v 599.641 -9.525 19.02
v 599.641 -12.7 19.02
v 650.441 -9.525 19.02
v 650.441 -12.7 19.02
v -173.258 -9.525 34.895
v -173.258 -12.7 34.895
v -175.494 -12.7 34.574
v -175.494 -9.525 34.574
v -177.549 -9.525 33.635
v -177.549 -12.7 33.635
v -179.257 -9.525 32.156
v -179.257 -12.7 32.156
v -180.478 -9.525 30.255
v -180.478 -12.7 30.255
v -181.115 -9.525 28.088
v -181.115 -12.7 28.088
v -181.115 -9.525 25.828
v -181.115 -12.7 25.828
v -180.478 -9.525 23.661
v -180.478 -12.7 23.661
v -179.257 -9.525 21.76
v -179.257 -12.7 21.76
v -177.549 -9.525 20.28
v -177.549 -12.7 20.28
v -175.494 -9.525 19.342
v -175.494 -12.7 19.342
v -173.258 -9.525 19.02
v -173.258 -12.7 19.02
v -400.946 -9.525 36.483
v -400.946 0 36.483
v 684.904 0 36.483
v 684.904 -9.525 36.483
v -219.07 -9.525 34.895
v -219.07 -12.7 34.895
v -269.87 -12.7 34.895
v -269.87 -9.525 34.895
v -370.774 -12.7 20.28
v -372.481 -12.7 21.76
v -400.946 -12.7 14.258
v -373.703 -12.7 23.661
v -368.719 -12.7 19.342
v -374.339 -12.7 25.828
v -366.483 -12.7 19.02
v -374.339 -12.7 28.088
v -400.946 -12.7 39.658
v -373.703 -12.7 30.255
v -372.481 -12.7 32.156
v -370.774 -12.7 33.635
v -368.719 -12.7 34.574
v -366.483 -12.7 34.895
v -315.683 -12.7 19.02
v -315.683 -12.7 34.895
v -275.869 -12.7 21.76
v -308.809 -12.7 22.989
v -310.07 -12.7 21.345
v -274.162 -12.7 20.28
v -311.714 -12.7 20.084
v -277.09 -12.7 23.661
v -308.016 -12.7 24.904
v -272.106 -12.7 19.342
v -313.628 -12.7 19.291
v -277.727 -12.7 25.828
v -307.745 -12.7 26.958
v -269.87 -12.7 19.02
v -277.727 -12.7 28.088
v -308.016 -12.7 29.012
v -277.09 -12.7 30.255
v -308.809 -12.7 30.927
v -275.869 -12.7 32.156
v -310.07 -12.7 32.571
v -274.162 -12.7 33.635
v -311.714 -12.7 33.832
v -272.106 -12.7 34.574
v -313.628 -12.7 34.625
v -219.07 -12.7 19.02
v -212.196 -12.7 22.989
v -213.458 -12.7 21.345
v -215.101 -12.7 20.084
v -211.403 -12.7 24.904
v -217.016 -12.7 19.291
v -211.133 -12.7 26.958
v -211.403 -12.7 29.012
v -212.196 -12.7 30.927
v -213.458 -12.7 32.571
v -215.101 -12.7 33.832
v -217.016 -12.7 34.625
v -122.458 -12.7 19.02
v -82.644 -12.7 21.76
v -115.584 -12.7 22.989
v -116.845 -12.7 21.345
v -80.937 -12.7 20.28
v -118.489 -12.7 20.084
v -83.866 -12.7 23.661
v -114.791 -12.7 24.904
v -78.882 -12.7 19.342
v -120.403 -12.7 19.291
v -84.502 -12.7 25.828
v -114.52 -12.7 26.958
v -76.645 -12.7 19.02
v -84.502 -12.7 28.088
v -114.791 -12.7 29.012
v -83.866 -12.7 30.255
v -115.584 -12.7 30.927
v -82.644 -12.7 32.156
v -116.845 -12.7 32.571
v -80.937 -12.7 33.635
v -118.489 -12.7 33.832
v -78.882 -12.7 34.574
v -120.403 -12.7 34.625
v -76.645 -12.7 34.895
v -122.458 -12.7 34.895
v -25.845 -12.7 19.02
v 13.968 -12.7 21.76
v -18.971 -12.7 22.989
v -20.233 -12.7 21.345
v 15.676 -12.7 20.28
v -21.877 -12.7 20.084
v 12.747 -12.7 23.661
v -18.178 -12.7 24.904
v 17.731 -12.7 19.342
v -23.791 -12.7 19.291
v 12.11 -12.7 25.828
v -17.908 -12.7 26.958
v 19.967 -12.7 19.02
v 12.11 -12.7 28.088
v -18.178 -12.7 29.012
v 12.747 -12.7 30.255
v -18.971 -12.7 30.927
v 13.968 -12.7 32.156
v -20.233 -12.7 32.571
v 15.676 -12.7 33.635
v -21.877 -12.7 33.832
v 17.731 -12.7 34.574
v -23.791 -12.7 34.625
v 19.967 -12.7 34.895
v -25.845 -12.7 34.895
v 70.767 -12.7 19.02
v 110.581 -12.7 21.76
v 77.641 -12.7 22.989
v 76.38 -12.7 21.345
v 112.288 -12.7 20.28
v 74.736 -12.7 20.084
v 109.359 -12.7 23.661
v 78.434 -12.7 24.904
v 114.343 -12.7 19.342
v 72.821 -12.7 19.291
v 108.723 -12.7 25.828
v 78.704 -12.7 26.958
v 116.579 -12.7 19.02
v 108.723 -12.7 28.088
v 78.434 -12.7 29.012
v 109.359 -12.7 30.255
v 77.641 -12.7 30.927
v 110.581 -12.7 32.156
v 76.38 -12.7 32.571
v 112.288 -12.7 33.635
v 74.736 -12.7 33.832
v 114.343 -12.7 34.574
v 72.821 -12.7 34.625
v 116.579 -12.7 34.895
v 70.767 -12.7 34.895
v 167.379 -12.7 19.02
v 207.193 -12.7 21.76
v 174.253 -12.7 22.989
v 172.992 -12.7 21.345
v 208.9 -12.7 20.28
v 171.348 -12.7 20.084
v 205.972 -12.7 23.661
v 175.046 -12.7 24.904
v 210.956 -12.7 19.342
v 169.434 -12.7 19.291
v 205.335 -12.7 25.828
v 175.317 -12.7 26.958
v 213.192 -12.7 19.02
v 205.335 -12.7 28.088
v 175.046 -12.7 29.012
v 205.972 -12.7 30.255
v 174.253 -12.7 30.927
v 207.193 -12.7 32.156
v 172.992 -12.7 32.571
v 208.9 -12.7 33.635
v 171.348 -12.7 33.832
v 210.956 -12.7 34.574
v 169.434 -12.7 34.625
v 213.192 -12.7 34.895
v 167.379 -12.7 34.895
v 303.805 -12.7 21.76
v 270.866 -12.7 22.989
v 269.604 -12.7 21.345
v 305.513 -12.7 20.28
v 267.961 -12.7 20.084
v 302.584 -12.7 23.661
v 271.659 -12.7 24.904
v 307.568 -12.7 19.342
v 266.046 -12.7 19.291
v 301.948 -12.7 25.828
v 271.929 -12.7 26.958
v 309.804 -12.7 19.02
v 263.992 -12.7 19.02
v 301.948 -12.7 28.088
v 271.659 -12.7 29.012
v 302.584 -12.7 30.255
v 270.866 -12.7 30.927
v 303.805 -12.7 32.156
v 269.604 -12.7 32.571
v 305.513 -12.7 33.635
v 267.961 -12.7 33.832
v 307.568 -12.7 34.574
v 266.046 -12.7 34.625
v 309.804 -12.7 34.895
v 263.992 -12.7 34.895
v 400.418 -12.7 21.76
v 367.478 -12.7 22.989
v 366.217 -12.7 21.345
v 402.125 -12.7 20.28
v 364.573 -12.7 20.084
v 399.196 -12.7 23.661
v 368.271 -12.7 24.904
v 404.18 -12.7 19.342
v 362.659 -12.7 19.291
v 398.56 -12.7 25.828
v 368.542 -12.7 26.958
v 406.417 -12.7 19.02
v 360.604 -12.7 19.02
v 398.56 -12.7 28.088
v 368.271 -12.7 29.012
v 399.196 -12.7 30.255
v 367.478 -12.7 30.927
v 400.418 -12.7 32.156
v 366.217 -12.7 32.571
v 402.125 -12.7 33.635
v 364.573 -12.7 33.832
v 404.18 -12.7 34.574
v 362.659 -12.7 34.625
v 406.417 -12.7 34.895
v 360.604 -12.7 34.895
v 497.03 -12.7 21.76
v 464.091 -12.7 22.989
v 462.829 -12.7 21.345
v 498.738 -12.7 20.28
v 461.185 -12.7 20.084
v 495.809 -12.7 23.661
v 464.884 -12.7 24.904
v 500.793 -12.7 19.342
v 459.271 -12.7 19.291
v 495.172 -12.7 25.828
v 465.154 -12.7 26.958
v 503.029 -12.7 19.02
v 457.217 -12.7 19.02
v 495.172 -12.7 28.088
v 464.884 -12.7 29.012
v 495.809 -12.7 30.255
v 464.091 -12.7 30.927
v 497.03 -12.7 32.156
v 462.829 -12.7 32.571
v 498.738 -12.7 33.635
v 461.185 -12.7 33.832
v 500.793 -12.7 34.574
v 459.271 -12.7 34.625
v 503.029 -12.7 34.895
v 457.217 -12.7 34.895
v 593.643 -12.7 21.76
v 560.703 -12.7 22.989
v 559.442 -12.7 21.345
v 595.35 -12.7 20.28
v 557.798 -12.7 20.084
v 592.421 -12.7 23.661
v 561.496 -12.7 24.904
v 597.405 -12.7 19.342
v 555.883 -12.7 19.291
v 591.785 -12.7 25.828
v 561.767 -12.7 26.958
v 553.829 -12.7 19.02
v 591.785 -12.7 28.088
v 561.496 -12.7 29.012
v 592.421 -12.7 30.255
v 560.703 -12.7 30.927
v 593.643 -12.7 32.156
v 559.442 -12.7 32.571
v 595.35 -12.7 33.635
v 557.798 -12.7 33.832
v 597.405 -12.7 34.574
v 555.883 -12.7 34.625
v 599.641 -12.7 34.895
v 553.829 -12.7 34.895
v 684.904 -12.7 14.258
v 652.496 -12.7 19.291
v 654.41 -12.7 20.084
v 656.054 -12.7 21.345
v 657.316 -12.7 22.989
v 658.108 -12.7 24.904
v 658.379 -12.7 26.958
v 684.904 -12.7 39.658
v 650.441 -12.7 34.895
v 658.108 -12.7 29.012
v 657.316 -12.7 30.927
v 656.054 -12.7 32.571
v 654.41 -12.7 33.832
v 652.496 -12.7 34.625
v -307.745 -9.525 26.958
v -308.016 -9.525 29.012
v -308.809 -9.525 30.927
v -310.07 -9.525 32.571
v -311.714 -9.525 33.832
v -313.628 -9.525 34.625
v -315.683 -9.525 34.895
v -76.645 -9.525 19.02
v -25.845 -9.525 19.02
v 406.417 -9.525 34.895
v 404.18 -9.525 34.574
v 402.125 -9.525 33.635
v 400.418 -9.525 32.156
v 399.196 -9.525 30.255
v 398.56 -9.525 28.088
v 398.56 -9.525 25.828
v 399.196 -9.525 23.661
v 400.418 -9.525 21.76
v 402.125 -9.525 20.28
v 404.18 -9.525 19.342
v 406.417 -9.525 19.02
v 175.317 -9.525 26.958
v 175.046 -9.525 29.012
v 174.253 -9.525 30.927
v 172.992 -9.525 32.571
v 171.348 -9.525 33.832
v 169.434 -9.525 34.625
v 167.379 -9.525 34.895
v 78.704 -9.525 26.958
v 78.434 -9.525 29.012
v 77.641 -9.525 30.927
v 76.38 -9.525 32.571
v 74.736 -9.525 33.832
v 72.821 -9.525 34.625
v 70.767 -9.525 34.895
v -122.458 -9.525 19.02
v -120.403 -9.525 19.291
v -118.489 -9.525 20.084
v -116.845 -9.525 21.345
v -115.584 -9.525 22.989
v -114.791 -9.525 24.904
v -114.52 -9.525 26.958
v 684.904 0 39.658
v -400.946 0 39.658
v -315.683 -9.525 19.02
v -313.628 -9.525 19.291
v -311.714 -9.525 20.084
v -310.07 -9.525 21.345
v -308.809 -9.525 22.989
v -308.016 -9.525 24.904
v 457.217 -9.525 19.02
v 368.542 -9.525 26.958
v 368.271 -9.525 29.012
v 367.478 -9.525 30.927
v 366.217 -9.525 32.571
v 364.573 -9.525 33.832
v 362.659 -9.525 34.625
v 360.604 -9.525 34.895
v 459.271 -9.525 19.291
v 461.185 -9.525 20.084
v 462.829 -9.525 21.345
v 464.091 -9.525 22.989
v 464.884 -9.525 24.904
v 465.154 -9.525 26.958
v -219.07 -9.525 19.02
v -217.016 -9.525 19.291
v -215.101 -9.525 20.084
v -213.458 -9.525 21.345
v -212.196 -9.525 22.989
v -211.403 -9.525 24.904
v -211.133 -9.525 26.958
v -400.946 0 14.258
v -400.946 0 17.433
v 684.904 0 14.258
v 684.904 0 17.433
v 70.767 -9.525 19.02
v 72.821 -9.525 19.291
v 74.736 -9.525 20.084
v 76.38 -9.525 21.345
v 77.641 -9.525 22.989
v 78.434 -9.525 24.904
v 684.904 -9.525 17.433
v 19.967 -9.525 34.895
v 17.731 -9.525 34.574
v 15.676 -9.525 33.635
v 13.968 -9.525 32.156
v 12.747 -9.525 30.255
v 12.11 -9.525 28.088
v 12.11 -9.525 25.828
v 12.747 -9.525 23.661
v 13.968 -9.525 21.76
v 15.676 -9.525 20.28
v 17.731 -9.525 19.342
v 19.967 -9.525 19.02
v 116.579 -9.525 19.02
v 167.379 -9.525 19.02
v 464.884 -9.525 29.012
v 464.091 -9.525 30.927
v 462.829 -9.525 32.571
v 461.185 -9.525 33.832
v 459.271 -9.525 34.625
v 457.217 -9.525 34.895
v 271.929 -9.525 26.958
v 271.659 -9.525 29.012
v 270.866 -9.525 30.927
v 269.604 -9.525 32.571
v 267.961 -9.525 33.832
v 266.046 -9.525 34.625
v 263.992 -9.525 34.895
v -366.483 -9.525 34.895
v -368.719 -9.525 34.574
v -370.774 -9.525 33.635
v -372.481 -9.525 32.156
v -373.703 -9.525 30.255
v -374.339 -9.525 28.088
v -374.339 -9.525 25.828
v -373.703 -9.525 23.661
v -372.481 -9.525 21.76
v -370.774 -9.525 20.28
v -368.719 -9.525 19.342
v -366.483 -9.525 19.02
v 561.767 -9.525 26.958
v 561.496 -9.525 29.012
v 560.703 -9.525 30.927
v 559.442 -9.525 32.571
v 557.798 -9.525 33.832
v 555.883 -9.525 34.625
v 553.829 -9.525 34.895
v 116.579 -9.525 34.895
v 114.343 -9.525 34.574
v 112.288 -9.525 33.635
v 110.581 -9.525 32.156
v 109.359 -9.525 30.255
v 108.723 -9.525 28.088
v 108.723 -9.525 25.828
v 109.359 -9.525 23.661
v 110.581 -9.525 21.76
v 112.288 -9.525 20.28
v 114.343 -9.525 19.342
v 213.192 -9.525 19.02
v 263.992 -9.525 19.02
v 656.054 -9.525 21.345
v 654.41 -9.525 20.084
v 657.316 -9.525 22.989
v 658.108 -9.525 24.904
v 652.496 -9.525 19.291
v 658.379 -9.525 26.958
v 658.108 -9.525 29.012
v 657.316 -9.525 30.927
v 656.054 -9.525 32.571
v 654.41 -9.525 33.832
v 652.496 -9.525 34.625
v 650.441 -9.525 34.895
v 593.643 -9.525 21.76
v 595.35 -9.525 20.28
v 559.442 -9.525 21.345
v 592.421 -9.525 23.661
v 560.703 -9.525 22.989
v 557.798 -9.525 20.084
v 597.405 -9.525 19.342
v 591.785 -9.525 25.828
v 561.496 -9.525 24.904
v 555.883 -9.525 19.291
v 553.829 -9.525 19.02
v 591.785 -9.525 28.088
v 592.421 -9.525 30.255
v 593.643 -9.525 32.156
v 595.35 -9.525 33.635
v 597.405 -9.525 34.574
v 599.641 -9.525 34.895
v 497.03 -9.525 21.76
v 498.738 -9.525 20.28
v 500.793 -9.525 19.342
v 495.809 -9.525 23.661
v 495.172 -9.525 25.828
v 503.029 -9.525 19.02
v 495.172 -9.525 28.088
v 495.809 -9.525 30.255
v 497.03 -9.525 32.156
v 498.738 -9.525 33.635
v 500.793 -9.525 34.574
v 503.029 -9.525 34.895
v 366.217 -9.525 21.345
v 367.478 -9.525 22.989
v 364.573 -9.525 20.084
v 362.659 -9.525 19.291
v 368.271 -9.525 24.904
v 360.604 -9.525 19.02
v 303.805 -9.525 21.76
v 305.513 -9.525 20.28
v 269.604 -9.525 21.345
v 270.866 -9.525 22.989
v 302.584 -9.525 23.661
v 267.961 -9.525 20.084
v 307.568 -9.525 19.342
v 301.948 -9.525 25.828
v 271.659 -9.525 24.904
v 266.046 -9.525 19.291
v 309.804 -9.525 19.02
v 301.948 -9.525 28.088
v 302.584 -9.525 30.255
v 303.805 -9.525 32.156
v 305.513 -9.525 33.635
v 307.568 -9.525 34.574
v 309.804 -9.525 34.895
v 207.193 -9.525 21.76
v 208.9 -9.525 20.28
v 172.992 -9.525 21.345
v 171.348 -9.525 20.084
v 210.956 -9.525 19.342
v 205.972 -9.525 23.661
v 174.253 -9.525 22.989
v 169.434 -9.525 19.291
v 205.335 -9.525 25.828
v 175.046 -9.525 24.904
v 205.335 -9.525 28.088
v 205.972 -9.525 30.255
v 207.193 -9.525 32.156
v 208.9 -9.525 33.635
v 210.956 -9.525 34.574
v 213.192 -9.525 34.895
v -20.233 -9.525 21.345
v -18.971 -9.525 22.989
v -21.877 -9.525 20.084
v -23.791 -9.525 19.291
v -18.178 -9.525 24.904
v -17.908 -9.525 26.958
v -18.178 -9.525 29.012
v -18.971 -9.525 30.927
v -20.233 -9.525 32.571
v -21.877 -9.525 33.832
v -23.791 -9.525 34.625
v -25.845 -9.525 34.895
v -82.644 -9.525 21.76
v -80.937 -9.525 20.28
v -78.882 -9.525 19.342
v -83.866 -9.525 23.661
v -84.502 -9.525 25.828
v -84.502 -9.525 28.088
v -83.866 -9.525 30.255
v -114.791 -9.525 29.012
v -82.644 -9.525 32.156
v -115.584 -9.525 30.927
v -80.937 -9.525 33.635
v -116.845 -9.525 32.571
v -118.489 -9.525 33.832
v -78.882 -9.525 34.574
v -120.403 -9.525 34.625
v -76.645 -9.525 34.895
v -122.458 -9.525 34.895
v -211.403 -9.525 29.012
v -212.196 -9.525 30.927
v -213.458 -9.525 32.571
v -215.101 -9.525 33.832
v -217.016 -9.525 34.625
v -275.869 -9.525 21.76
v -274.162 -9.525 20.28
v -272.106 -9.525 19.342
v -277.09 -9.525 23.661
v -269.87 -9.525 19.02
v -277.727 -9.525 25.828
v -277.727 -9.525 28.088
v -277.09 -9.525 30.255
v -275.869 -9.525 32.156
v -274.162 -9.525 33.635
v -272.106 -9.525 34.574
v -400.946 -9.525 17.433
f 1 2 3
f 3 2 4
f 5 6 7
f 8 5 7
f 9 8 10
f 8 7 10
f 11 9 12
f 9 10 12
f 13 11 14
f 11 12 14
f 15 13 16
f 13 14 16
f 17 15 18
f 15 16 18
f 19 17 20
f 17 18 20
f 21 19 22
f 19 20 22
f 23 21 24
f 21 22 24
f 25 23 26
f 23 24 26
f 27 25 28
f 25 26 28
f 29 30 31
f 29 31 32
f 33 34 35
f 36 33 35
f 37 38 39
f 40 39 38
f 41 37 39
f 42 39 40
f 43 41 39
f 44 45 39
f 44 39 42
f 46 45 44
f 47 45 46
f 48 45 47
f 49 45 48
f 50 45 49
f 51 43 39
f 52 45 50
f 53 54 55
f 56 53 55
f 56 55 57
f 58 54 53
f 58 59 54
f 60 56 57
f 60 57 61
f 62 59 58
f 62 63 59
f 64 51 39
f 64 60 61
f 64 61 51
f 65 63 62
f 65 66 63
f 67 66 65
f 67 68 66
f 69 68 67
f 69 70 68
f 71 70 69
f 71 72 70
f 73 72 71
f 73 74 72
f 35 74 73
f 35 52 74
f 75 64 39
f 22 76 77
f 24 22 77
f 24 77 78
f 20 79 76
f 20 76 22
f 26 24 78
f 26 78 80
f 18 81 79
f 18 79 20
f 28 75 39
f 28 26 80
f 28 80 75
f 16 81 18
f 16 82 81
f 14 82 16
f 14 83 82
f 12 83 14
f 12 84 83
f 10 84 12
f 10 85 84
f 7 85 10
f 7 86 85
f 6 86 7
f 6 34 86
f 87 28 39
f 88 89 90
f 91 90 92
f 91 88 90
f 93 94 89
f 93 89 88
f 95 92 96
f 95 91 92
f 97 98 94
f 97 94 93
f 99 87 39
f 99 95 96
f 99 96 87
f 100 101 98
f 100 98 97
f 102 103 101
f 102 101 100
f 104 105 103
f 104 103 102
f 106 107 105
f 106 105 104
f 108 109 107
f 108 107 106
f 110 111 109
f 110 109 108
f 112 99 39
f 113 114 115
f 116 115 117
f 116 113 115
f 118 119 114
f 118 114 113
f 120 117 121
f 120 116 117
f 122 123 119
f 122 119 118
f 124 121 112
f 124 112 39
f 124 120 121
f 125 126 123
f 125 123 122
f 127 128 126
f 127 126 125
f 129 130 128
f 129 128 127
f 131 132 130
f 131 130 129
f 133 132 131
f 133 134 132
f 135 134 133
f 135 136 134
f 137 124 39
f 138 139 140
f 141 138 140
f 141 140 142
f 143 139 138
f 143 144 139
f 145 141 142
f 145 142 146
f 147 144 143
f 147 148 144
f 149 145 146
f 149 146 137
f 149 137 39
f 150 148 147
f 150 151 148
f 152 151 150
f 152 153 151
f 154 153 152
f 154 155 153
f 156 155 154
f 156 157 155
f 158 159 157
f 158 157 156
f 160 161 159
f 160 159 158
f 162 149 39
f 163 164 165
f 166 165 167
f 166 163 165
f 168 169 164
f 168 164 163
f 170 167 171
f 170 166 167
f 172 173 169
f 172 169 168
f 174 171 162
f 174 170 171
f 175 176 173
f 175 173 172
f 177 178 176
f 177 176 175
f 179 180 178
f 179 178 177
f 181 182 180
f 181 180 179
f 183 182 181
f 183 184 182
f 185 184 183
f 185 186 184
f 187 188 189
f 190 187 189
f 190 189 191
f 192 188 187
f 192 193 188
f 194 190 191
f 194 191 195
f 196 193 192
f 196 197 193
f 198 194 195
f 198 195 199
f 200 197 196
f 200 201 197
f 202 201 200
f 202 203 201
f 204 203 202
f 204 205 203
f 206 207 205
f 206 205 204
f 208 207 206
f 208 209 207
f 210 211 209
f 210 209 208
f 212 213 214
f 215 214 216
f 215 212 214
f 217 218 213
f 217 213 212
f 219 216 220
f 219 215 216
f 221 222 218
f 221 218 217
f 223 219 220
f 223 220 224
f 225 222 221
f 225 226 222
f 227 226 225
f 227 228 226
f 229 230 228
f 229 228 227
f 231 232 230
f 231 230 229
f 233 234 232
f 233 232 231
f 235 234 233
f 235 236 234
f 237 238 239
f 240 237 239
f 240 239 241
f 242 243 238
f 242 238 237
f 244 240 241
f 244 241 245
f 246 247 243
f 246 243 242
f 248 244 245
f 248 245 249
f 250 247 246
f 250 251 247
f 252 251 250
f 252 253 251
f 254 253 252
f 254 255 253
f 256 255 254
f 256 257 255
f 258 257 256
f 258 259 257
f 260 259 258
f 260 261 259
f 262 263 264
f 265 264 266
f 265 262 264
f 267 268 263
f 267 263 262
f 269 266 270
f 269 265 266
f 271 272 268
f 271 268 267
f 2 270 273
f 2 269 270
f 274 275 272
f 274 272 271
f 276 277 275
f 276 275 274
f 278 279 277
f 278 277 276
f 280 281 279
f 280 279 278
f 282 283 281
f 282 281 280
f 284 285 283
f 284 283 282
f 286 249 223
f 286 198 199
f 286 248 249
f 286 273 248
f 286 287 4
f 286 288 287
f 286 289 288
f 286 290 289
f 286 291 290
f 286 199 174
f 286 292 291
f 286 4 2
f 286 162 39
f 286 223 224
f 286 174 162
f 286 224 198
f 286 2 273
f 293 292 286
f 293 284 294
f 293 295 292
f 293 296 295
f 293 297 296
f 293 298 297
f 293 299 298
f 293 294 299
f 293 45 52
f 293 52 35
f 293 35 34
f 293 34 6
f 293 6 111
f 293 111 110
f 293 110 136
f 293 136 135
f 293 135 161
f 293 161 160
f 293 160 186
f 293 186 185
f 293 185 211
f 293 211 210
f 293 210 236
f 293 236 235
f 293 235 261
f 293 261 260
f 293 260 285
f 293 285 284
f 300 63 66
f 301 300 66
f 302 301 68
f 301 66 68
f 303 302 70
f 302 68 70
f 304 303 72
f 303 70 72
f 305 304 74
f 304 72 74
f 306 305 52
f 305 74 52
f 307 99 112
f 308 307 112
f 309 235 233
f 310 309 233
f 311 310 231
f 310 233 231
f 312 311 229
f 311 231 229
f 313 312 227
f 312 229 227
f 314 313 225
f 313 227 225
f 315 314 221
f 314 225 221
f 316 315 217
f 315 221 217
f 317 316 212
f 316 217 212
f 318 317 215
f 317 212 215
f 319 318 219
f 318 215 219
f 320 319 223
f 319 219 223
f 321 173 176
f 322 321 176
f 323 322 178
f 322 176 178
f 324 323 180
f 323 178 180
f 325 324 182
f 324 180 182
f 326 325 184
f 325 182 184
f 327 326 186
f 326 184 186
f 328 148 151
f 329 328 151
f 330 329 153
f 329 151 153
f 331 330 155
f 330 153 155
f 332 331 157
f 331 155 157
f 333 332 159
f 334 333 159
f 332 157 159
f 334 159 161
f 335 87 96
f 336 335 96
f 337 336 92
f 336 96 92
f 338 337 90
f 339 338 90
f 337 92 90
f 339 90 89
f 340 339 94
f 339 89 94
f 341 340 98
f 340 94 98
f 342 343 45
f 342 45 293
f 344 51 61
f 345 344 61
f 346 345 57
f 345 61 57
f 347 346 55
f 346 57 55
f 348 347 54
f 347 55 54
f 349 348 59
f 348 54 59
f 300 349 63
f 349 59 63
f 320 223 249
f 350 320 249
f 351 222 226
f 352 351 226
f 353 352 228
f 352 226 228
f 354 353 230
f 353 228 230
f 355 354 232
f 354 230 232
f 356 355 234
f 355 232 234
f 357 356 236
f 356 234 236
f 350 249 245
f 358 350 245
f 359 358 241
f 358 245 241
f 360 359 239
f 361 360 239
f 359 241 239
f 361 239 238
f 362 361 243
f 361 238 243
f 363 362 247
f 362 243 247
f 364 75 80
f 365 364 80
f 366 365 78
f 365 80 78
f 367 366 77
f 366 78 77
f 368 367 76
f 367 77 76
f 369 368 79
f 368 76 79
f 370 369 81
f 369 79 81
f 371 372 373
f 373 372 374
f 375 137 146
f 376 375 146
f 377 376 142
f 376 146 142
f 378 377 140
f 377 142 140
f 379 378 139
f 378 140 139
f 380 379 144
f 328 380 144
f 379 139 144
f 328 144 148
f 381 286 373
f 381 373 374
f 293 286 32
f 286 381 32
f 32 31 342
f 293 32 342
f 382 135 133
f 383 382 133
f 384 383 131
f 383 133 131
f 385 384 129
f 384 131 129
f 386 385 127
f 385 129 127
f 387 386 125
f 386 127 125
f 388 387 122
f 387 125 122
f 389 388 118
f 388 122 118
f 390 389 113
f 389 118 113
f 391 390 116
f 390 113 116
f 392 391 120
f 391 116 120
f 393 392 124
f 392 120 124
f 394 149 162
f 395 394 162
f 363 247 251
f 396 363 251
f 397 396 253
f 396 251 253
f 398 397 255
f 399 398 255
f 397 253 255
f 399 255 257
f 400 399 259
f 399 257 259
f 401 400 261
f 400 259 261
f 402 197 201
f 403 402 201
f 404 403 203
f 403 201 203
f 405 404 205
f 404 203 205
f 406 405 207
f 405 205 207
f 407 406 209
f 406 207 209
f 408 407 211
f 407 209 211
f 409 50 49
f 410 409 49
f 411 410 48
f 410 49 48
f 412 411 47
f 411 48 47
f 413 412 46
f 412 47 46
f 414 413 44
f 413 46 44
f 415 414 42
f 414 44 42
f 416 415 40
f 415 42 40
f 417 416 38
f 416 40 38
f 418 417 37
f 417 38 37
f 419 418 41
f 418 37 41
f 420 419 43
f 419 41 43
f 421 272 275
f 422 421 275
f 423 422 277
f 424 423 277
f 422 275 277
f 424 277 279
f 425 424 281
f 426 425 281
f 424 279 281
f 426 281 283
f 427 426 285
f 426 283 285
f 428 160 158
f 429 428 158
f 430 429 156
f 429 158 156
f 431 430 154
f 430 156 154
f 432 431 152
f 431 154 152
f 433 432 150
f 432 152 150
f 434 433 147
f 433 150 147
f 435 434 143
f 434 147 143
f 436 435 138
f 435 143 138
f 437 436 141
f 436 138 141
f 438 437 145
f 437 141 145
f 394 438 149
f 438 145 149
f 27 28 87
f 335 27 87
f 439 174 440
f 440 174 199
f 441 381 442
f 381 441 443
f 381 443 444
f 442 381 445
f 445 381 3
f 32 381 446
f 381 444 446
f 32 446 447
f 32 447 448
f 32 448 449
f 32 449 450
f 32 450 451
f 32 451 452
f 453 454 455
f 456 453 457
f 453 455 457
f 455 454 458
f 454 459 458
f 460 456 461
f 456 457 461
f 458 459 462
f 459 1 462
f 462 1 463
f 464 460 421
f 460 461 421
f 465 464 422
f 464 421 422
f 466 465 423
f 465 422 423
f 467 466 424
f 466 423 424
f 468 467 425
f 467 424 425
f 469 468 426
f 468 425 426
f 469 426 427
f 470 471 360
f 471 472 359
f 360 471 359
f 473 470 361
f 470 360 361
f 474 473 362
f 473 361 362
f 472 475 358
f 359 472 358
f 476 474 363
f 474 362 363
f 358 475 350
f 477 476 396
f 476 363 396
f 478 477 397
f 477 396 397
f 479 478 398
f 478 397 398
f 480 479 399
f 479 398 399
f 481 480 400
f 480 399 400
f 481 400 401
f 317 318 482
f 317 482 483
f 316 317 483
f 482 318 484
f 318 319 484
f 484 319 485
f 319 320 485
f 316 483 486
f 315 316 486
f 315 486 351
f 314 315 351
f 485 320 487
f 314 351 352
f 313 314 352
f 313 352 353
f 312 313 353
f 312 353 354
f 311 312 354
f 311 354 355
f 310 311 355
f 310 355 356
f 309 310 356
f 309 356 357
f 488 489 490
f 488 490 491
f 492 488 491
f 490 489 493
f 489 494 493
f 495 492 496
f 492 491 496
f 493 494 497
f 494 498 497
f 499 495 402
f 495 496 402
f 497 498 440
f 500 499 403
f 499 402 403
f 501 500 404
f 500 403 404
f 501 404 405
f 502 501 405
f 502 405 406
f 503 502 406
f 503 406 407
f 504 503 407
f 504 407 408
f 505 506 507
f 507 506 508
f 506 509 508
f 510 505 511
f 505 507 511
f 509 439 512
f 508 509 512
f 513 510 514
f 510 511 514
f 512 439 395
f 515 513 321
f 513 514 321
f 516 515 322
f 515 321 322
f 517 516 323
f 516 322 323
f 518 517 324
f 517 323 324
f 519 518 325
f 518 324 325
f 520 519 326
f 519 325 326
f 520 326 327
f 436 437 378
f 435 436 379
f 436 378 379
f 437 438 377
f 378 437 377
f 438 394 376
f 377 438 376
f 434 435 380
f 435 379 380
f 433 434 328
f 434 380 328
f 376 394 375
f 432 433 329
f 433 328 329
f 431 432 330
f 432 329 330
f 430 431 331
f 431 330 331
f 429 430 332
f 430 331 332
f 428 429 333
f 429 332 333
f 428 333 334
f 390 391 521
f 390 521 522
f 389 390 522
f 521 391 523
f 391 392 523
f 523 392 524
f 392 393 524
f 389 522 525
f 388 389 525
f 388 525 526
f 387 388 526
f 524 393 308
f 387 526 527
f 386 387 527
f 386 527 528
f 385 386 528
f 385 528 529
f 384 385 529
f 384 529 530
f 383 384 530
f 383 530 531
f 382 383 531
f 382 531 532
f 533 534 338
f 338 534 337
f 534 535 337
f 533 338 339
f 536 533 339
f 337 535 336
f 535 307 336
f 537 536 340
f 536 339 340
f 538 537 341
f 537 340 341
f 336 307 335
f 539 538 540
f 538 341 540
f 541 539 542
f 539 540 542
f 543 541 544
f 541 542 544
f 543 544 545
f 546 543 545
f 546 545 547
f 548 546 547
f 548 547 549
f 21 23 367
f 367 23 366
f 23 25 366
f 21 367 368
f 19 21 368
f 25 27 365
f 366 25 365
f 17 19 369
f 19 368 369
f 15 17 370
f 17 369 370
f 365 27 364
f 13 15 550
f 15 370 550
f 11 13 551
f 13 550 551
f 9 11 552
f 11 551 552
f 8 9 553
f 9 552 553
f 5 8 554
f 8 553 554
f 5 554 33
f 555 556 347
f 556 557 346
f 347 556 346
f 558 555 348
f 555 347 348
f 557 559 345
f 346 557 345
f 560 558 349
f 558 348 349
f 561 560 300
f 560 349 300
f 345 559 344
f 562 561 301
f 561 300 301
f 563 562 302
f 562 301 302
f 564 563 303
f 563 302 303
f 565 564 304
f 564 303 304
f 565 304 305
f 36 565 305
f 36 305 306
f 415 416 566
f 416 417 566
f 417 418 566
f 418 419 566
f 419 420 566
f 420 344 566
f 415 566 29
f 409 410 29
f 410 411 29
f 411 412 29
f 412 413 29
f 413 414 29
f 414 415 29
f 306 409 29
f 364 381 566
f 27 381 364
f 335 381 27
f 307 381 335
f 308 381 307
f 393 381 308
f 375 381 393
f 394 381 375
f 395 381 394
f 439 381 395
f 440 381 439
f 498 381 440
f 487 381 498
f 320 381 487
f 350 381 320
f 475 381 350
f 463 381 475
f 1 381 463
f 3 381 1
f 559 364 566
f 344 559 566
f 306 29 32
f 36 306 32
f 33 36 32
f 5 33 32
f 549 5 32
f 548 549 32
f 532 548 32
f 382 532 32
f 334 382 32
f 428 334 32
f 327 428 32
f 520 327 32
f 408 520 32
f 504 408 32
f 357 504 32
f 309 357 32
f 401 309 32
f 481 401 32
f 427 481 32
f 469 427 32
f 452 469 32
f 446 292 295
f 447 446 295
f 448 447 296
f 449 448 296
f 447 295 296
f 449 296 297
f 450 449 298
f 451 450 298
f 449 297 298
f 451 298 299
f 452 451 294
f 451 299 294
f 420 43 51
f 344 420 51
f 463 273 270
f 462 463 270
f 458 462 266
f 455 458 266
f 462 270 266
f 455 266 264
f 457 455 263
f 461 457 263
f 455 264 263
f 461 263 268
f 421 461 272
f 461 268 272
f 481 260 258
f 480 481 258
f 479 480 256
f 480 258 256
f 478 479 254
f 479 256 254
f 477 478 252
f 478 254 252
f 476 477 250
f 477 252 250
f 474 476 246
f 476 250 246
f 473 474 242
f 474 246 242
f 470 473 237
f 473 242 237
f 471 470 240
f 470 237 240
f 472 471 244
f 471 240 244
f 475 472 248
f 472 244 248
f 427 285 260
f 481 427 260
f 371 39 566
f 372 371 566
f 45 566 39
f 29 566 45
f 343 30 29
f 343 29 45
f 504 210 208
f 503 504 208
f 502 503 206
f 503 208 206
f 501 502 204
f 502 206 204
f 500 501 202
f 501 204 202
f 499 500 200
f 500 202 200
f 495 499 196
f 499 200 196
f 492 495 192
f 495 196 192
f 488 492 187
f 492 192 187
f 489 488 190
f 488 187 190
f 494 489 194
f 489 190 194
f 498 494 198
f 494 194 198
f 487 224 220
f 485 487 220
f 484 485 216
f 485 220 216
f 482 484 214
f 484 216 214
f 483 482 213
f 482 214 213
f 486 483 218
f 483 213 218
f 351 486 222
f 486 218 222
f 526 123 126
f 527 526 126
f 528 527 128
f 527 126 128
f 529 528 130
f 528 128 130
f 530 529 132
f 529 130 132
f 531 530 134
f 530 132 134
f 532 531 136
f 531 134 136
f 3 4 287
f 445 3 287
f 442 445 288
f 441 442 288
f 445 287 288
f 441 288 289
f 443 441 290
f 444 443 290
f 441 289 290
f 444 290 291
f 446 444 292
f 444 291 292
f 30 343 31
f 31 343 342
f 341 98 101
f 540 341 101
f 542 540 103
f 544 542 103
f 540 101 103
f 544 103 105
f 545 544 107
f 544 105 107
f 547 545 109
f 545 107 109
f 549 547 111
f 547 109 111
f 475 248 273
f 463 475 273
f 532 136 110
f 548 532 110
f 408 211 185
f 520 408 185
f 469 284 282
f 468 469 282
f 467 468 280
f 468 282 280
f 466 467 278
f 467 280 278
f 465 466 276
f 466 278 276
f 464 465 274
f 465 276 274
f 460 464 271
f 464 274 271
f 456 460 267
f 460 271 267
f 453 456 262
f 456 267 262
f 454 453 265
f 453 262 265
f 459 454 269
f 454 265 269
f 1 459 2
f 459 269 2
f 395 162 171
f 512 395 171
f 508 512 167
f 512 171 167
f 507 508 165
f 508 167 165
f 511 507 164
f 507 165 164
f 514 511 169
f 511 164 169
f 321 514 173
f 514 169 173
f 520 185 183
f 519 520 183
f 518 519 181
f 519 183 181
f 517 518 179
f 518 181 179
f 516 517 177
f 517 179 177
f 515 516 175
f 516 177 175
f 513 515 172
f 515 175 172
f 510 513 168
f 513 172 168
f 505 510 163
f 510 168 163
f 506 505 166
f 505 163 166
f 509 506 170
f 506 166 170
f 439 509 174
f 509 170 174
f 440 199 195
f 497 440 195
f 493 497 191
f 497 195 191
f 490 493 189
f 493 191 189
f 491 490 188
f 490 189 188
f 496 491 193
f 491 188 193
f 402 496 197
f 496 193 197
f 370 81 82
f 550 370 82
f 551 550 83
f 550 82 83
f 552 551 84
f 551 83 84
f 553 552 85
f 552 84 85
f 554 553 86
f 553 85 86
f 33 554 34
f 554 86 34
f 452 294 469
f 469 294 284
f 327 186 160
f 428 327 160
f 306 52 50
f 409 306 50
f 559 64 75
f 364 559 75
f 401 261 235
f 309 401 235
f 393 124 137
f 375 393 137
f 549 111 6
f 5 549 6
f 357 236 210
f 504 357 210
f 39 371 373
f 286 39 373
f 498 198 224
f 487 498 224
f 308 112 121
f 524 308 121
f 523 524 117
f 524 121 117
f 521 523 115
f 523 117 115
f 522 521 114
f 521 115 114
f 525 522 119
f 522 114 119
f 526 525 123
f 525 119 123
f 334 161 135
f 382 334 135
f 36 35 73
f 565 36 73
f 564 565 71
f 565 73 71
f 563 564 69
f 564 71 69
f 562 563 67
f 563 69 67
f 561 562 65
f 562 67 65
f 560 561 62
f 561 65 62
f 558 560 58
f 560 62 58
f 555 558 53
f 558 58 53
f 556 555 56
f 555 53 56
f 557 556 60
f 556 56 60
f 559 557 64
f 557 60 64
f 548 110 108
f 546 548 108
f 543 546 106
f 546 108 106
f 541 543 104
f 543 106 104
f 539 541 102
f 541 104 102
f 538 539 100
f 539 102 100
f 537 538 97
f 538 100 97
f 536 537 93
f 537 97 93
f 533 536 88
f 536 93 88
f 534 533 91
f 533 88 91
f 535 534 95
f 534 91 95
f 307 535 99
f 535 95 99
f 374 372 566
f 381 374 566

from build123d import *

# Parameters (mm, degrees)
F0_W     = 1085.85
F0_H     = 25.4
F1_DEPTH = 12.7
F2_W     = 9.525
F2_H     = 19.05
F3_DEPTH = 1085.851
F5_DEPTH = 12.701


with BuildPart() as f1:
    # F0 (on Front) → F1 (new body)
    with BuildSketch(Plane.XZ):
        with Locations((141.979393, 26.957907)):
            Rectangle(F0_W, F0_H)
    extrude(amount=F1_DEPTH)

    # F2 (on face) → F3 (cut, through all)
    with BuildSketch(Plane(origin=(-400.945607, 0, 0), x_dir=(0, -1, 0), z_dir=(-1, 0, 0))):
        with Locations((4.7625, 26.957907)):
            Rectangle(F2_W, F2_H)
    extrude(amount=-F3_DEPTH, mode=Mode.SUBTRACT)

    # F4 (on face) → F5 (cut, through all)
    with BuildSketch(Plane.XZ.offset(12.7)):
        with BuildLine():
            ThreePointArc((-366.482657, 19.020407), (-360.869997, 21.345247), (-358.545157, 26.957907))
            ThreePointArc((-358.545157, 26.957907), (-360.869997, 32.570567), (-366.482657, 34.895407))
            ThreePointArc((-366.482657, 34.895407), (-374.420157, 26.957907), (-366.482657, 19.020407))
        make_face()
        with BuildLine():
            ThreePointArc((-366.482657, 34.895407), (-360.869997, 32.570567), (-358.545157, 26.957907))
            ThreePointArc((-358.545157, 26.957907), (-360.869997, 21.345247), (-366.482657, 19.020407))
            Line((-366.482657, 19.020407), (-315.682657, 19.020407))
            ThreePointArc((-315.682657, 19.020407), (-323.620157, 26.957907), (-315.682657, 34.895407))
            Line((-315.682657, 34.895407), (-366.482657, 34.895407))
        make_face()
        with BuildLine():
            ThreePointArc((-307.745157, 26.957907), (-310.069997, 32.570567), (-315.682657, 34.895407))
            ThreePointArc((-315.682657, 34.895407), (-323.620157, 26.957907), (-315.682657, 19.020407))
            ThreePointArc((-315.682657, 19.020407), (-310.069997, 21.345247), (-307.745157, 26.957907))
        make_face()
        with BuildLine():
            ThreePointArc((-261.932747, 26.957907), (-264.257587, 32.570567), (-269.870247, 34.895407))
            ThreePointArc((-269.870247, 34.895407), (-277.807747, 26.957907), (-269.870247, 19.020407))
            ThreePointArc((-269.870247, 19.020407), (-264.257587, 21.345247), (-261.932747, 26.957907))
        make_face()
        with BuildLine():
            Line((-219.070247, 34.895407), (-269.870247, 34.895407))
            ThreePointArc((-269.870247, 34.895407), (-264.257587, 32.570567), (-261.932747, 26.957907))
            ThreePointArc((-261.932747, 26.957907), (-264.257587, 21.345247), (-269.870247, 19.020407))
            Line((-269.870247, 19.020407), (-219.070247, 19.020407))
            ThreePointArc((-219.070247, 19.020407), (-227.007747, 26.957907), (-219.070247, 34.895407))
        make_face()
        with BuildLine():
            ThreePointArc((-211.132747, 26.957907), (-213.457587, 32.570567), (-219.070247, 34.895407))
            ThreePointArc((-219.070247, 34.895407), (-227.007747, 26.957907), (-219.070247, 19.020407))
            ThreePointArc((-219.070247, 19.020407), (-213.457587, 21.345247), (-211.132747, 26.957907))
        make_face()
        with BuildLine():
            ThreePointArc((-165.320337, 26.957907), (-167.645177, 32.570567), (-173.257837, 34.895407))
            ThreePointArc((-173.257837, 34.895407), (-181.195337, 26.957907), (-173.257837, 19.020407))
            ThreePointArc((-173.257837, 19.020407), (-167.645177, 21.345247), (-165.320337, 26.957907))
        make_face()
        with BuildLine():
            Line((-122.457837, 34.895407), (-173.257837, 34.895407))
            ThreePointArc((-173.257837, 34.895407), (-167.645177, 32.570567), (-165.320337, 26.957907))
            ThreePointArc((-165.320337, 26.957907), (-167.645177, 21.345247), (-173.257837, 19.020407))
            Line((-173.257837, 19.020407), (-122.457837, 19.020407))
            ThreePointArc((-122.457837, 19.020407), (-130.395337, 26.957907), (-122.457837, 34.895407))
        make_face()
        with BuildLine():
            ThreePointArc((-114.520337, 26.957907), (-116.845177, 32.570567), (-122.457837, 34.895407))
            ThreePointArc((-122.457837, 34.895407), (-130.395337, 26.957907), (-122.457837, 19.020407))
            ThreePointArc((-122.457837, 19.020407), (-116.845177, 21.345247), (-114.520337, 26.957907))
        make_face()
        with BuildLine():
            ThreePointArc((-68.707927, 26.957907), (-71.032767, 32.570567), (-76.645427, 34.895407))
            ThreePointArc((-76.645427, 34.895407), (-84.582927, 26.957907), (-76.645427, 19.020407))
            ThreePointArc((-76.645427, 19.020407), (-71.032767, 21.345247), (-68.707927, 26.957907))
        make_face()
        with BuildLine():
            Line((-25.845427, 34.895407), (-76.645427, 34.895407))
            ThreePointArc((-76.645427, 34.895407), (-71.032767, 32.570567), (-68.707927, 26.957907))
            ThreePointArc((-68.707927, 26.957907), (-71.032767, 21.345247), (-76.645427, 19.020407))
            Line((-76.645427, 19.020407), (-25.845427, 19.020407))
            ThreePointArc((-25.845427, 19.020407), (-33.782927, 26.957907), (-25.845427, 34.895407))
        make_face()
        with BuildLine():
            ThreePointArc((-17.907927, 26.957907), (-20.232767, 32.570567), (-25.845427, 34.895407))
            ThreePointArc((-25.845427, 34.895407), (-33.782927, 26.957907), (-25.845427, 19.020407))
            ThreePointArc((-25.845427, 19.020407), (-20.232767, 21.345247), (-17.907927, 26.957907))
        make_face()
        with BuildLine():
            ThreePointArc((27.904483, 26.957907), (25.579643, 32.570567), (19.966983, 34.895407))
            ThreePointArc((19.966983, 34.895407), (12.029483, 26.957907), (19.966983, 19.020407))
            ThreePointArc((19.966983, 19.020407), (25.579643, 21.345247), (27.904483, 26.957907))
        make_face()
        with BuildLine():
            Line((70.766983, 34.895407), (19.966983, 34.895407))
            ThreePointArc((19.966983, 34.895407), (25.579643, 32.570567), (27.904483, 26.957907))
            ThreePointArc((27.904483, 26.957907), (25.579643, 21.345247), (19.966983, 19.020407))
            Line((19.966983, 19.020407), (70.766983, 19.020407))
            ThreePointArc((70.766983, 19.020407), (62.829483, 26.957907), (70.766983, 34.895407))
        make_face()
        with BuildLine():
            ThreePointArc((78.704483, 26.957907), (76.379643, 32.570567), (70.766983, 34.895407))
            ThreePointArc((70.766983, 34.895407), (62.829483, 26.957907), (70.766983, 19.020407))
            ThreePointArc((70.766983, 19.020407), (76.379643, 21.345247), (78.704483, 26.957907))
        make_face()
        with BuildLine():
            ThreePointArc((124.516893, 26.957907), (122.192053, 32.570567), (116.579393, 34.895407))
            ThreePointArc((116.579393, 34.895407), (108.641893, 26.957907), (116.579393, 19.020407))
            ThreePointArc((116.579393, 19.020407), (122.192053, 21.345247), (124.516893, 26.957907))
        make_face()
        with BuildLine():
            Line((141.979393, 34.895407), (116.579393, 34.895407))
            ThreePointArc((116.579393, 34.895407), (122.192053, 32.570567), (124.516893, 26.957907))
            ThreePointArc((124.516893, 26.957907), (122.192053, 21.345247), (116.579393, 19.020407))
            Line((116.579393, 19.020407), (141.979393, 19.020407))
            Line((141.979393, 19.020407), (141.979393, 34.895407))
        make_face()
        with BuildLine():
            Line((167.379393, 34.895407), (141.979393, 34.895407))
            Line((141.979393, 34.895407), (141.979393, 19.020407))
            Line((141.979393, 19.020407), (167.379393, 19.020407))
            ThreePointArc((167.379393, 19.020407), (159.441893, 26.957907), (167.379393, 34.895407))
        make_face()
        with BuildLine():
            ThreePointArc((175.316893, 26.957907), (172.992053, 32.570567), (167.379393, 34.895407))
            ThreePointArc((167.379393, 34.895407), (159.441893, 26.957907), (167.379393, 19.020407))
            ThreePointArc((167.379393, 19.020407), (172.992053, 21.345247), (175.316893, 26.957907))
        make_face()
        with BuildLine():
            ThreePointArc((213.191803, 19.020407), (218.804463, 21.345247), (221.129303, 26.957907))
            ThreePointArc((221.129303, 26.957907), (218.804463, 32.570567), (213.191803, 34.895407))
            ThreePointArc((213.191803, 34.895407), (205.254303, 26.957907), (213.191803, 19.020407))
        make_face()
        with BuildLine():
            ThreePointArc((213.191803, 34.895407), (218.804463, 32.570567), (221.129303, 26.957907))
            ThreePointArc((221.129303, 26.957907), (218.804463, 21.345247), (213.191803, 19.020407))
            Line((213.191803, 19.020407), (263.991803, 19.020407))
            ThreePointArc((263.991803, 19.020407), (256.054303, 26.957907), (263.991803, 34.895407))
            Line((263.991803, 34.895407), (213.191803, 34.895407))
        make_face()
        with BuildLine():
            ThreePointArc((271.929303, 26.957907), (269.604463, 32.570567), (263.991803, 34.895407))
            ThreePointArc((263.991803, 34.895407), (256.054303, 26.957907), (263.991803, 19.020407))
            ThreePointArc((263.991803, 19.020407), (269.604463, 21.345247), (271.929303, 26.957907))
        make_face()
        with BuildLine():
            ThreePointArc((309.804213, 19.020407), (315.416873, 21.345247), (317.741713, 26.957907))
            ThreePointArc((317.741713, 26.957907), (315.416873, 32.570567), (309.804213, 34.895407))
            ThreePointArc((309.804213, 34.895407), (301.866713, 26.957907), (309.804213, 19.020407))
        make_face()
        with BuildLine():
            ThreePointArc((309.804213, 34.895407), (315.416873, 32.570567), (317.741713, 26.957907))
            ThreePointArc((317.741713, 26.957907), (315.416873, 21.345247), (309.804213, 19.020407))
            Line((309.804213, 19.020407), (360.604213, 19.020407))
            ThreePointArc((360.604213, 19.020407), (352.666713, 26.957907), (360.604213, 34.895407))
            Line((360.604213, 34.895407), (309.804213, 34.895407))
        make_face()
        with BuildLine():
            ThreePointArc((368.541713, 26.957907), (366.216873, 32.570567), (360.604213, 34.895407))
            ThreePointArc((360.604213, 34.895407), (352.666713, 26.957907), (360.604213, 19.020407))
            ThreePointArc((360.604213, 19.020407), (366.216873, 21.345247), (368.541713, 26.957907))
        make_face()
        with BuildLine():
            ThreePointArc((406.416623, 19.020407), (412.029283, 21.345247), (414.354123, 26.957907))
            ThreePointArc((414.354123, 26.957907), (412.029283, 32.570567), (406.416623, 34.895407))
            ThreePointArc((406.416623, 34.895407), (398.479123, 26.957907), (406.416623, 19.020407))
        make_face()
        with BuildLine():
            ThreePointArc((406.416623, 34.895407), (412.029283, 32.570567), (414.354123, 26.957907))
            ThreePointArc((414.354123, 26.957907), (412.029283, 21.345247), (406.416623, 19.020407))
            Line((406.416623, 19.020407), (457.216623, 19.020407))
            ThreePointArc((457.216623, 19.020407), (449.279123, 26.957907), (457.216623, 34.895407))
            Line((457.216623, 34.895407), (406.416623, 34.895407))
        make_face()
        with BuildLine():
            ThreePointArc((465.154123, 26.957907), (462.829283, 32.570567), (457.216623, 34.895407))
            ThreePointArc((457.216623, 34.895407), (449.279123, 26.957907), (457.216623, 19.020407))
            ThreePointArc((457.216623, 19.020407), (462.829283, 21.345247), (465.154123, 26.957907))
        make_face()
        with BuildLine():
            ThreePointArc((510.966533, 26.957907), (508.641693, 32.570567), (503.029033, 34.895407))
            ThreePointArc((503.029033, 34.895407), (495.091533, 26.957907), (503.029033, 19.020407))
            ThreePointArc((503.029033, 19.020407), (508.641693, 21.345247), (510.966533, 26.957907))
        make_face()
        with BuildLine():
            ThreePointArc((553.829033, 19.020407), (545.891533, 26.957907), (553.829033, 34.895407))
            Line((553.829033, 34.895407), (503.029033, 34.895407))
            ThreePointArc((503.029033, 34.895407), (508.641693, 32.570567), (510.966533, 26.957907))
            ThreePointArc((510.966533, 26.957907), (508.641693, 21.345247), (503.029033, 19.020407))
            Line((503.029033, 19.020407), (553.829033, 19.020407))
        make_face()
        with BuildLine():
            ThreePointArc((553.829033, 19.020407), (559.441693, 21.345247), (561.766533, 26.957907))
            ThreePointArc((561.766533, 26.957907), (559.441693, 32.570567), (553.829033, 34.895407))
            ThreePointArc((553.829033, 34.895407), (545.891533, 26.957907), (553.829033, 19.020407))
        make_face()
        with BuildLine():
            ThreePointArc((607.578943, 26.957907), (605.254103, 32.570567), (599.641443, 34.895407))
            ThreePointArc((599.641443, 34.895407), (591.703943, 26.957907), (599.641443, 19.020407))
            ThreePointArc((599.641443, 19.020407), (605.254103, 21.345247), (607.578943, 26.957907))
        make_face()
        with BuildLine():
            ThreePointArc((650.441443, 19.020407), (642.503943, 26.957907), (650.441443, 34.895407))
            Line((650.441443, 34.895407), (599.641443, 34.895407))
            ThreePointArc((599.641443, 34.895407), (605.254103, 32.570567), (607.578943, 26.957907))
            ThreePointArc((607.578943, 26.957907), (605.254103, 21.345247), (599.641443, 19.020407))
            Line((599.641443, 19.020407), (650.441443, 19.020407))
        make_face()
        with BuildLine():
            ThreePointArc((650.441443, 19.020407), (656.054103, 21.345247), (658.378943, 26.957907))
            ThreePointArc((658.378943, 26.957907), (656.054103, 32.570567), (650.441443, 34.895407))
            ThreePointArc((650.441443, 34.895407), (642.503943, 26.957907), (650.441443, 19.020407))
        make_face()
    extrude(amount=-F5_DEPTH, mode=Mode.SUBTRACT)


solid = f1.part
